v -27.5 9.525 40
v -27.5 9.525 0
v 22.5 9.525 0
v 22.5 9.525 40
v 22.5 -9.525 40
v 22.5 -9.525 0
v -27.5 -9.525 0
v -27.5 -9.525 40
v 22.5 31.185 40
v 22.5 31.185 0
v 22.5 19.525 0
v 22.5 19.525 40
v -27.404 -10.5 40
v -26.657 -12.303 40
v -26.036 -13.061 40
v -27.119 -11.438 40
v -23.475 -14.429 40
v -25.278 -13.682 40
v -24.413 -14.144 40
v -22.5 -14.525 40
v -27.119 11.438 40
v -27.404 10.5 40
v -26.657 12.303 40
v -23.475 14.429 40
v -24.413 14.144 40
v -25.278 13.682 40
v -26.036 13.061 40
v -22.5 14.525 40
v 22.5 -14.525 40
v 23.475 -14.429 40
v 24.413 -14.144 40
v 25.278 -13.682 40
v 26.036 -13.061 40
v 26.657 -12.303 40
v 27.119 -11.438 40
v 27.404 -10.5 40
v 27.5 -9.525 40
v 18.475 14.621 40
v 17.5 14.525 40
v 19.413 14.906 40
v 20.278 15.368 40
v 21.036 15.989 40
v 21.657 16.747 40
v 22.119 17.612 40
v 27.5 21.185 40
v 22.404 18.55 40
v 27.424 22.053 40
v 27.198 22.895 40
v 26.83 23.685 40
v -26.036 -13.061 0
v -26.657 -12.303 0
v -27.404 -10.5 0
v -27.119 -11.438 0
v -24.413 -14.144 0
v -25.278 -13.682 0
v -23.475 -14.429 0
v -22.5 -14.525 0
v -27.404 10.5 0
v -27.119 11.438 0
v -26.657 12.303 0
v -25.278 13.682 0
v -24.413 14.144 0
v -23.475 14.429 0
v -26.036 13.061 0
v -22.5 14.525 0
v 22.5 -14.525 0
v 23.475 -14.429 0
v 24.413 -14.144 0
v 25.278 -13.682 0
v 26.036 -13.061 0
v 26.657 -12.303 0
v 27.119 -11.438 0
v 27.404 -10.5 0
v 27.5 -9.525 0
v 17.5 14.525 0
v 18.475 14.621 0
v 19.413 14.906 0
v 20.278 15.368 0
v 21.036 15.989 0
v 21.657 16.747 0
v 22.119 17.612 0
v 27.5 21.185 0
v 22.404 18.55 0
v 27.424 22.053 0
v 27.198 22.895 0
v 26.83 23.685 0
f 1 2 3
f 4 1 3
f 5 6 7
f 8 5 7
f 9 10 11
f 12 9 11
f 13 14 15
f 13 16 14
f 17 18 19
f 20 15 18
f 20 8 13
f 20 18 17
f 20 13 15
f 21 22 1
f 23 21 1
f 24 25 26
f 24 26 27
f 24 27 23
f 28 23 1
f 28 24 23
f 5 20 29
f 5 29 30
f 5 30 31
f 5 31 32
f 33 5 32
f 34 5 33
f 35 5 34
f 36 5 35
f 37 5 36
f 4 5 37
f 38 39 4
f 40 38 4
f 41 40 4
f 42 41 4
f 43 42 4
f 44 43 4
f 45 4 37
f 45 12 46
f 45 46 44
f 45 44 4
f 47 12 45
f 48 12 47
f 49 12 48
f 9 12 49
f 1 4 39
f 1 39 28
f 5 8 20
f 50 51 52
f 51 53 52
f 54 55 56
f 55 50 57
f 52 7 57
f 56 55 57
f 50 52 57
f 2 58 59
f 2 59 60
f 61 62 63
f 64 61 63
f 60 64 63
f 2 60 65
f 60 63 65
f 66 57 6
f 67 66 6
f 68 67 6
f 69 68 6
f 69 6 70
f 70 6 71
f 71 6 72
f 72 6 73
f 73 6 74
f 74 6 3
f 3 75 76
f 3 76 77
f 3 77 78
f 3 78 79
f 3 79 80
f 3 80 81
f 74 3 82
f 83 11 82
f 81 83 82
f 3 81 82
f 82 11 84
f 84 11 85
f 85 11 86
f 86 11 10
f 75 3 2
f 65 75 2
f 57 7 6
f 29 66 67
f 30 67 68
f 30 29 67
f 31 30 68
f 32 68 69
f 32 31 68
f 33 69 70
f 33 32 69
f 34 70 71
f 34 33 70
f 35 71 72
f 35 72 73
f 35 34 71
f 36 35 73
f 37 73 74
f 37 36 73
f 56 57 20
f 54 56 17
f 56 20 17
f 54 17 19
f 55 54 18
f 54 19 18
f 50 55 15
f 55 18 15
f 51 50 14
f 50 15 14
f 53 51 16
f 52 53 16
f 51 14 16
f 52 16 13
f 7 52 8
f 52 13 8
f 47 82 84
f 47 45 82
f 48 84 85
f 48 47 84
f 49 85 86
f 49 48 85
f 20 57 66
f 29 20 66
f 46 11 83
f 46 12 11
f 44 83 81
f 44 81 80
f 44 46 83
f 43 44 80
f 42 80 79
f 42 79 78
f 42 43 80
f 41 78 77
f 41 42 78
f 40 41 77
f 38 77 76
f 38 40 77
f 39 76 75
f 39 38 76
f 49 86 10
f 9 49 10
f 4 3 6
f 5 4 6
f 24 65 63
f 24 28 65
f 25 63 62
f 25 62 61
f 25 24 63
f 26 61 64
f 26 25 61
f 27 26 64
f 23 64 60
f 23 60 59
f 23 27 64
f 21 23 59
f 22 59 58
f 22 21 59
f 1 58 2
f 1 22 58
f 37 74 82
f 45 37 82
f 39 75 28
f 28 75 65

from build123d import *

# Parameters (mm, degrees)
F1_DEPTH = 40
F2_R     = 4.99999


# Not quite as in the source:
# - a fillet or chamfer is up to 0.001 mm smaller than in the source, because OpenCascade refuses the exact size


with BuildPart() as f1:
    # F0 (on Top) → F1 (new body)
    with BuildSketch(Plane.XY):
        Polygon((-27.5, -14.525), (27.5, -14.525), (27.5, 14.525), (27.5, 22.525), (22.5, 31.1852540378), (22.5, 22.525), (22.5, 14.525), (-27.5, 14.525), (-27.5, 9.525), (22.5, 9.525), (22.5, -9.525), (-27.5, -9.525), align=None)
    extrude(amount=F1_DEPTH)

    # F2 (radius 5 in the source; OpenCascade refuses exactly that, so slightly less here)
    f2_edges = [f1.edges().sort_by_distance(p)[0] for p in [
        (-27.5, 14.525, 20),
        (-27.5, -14.525, 20),
        (27.5, -14.525, 20),
        (27.5, 22.525, 20),
        (22.5, 14.525, 20),
    ]]
    fillet(f2_edges, radius=F2_R)


solid = f1.part
